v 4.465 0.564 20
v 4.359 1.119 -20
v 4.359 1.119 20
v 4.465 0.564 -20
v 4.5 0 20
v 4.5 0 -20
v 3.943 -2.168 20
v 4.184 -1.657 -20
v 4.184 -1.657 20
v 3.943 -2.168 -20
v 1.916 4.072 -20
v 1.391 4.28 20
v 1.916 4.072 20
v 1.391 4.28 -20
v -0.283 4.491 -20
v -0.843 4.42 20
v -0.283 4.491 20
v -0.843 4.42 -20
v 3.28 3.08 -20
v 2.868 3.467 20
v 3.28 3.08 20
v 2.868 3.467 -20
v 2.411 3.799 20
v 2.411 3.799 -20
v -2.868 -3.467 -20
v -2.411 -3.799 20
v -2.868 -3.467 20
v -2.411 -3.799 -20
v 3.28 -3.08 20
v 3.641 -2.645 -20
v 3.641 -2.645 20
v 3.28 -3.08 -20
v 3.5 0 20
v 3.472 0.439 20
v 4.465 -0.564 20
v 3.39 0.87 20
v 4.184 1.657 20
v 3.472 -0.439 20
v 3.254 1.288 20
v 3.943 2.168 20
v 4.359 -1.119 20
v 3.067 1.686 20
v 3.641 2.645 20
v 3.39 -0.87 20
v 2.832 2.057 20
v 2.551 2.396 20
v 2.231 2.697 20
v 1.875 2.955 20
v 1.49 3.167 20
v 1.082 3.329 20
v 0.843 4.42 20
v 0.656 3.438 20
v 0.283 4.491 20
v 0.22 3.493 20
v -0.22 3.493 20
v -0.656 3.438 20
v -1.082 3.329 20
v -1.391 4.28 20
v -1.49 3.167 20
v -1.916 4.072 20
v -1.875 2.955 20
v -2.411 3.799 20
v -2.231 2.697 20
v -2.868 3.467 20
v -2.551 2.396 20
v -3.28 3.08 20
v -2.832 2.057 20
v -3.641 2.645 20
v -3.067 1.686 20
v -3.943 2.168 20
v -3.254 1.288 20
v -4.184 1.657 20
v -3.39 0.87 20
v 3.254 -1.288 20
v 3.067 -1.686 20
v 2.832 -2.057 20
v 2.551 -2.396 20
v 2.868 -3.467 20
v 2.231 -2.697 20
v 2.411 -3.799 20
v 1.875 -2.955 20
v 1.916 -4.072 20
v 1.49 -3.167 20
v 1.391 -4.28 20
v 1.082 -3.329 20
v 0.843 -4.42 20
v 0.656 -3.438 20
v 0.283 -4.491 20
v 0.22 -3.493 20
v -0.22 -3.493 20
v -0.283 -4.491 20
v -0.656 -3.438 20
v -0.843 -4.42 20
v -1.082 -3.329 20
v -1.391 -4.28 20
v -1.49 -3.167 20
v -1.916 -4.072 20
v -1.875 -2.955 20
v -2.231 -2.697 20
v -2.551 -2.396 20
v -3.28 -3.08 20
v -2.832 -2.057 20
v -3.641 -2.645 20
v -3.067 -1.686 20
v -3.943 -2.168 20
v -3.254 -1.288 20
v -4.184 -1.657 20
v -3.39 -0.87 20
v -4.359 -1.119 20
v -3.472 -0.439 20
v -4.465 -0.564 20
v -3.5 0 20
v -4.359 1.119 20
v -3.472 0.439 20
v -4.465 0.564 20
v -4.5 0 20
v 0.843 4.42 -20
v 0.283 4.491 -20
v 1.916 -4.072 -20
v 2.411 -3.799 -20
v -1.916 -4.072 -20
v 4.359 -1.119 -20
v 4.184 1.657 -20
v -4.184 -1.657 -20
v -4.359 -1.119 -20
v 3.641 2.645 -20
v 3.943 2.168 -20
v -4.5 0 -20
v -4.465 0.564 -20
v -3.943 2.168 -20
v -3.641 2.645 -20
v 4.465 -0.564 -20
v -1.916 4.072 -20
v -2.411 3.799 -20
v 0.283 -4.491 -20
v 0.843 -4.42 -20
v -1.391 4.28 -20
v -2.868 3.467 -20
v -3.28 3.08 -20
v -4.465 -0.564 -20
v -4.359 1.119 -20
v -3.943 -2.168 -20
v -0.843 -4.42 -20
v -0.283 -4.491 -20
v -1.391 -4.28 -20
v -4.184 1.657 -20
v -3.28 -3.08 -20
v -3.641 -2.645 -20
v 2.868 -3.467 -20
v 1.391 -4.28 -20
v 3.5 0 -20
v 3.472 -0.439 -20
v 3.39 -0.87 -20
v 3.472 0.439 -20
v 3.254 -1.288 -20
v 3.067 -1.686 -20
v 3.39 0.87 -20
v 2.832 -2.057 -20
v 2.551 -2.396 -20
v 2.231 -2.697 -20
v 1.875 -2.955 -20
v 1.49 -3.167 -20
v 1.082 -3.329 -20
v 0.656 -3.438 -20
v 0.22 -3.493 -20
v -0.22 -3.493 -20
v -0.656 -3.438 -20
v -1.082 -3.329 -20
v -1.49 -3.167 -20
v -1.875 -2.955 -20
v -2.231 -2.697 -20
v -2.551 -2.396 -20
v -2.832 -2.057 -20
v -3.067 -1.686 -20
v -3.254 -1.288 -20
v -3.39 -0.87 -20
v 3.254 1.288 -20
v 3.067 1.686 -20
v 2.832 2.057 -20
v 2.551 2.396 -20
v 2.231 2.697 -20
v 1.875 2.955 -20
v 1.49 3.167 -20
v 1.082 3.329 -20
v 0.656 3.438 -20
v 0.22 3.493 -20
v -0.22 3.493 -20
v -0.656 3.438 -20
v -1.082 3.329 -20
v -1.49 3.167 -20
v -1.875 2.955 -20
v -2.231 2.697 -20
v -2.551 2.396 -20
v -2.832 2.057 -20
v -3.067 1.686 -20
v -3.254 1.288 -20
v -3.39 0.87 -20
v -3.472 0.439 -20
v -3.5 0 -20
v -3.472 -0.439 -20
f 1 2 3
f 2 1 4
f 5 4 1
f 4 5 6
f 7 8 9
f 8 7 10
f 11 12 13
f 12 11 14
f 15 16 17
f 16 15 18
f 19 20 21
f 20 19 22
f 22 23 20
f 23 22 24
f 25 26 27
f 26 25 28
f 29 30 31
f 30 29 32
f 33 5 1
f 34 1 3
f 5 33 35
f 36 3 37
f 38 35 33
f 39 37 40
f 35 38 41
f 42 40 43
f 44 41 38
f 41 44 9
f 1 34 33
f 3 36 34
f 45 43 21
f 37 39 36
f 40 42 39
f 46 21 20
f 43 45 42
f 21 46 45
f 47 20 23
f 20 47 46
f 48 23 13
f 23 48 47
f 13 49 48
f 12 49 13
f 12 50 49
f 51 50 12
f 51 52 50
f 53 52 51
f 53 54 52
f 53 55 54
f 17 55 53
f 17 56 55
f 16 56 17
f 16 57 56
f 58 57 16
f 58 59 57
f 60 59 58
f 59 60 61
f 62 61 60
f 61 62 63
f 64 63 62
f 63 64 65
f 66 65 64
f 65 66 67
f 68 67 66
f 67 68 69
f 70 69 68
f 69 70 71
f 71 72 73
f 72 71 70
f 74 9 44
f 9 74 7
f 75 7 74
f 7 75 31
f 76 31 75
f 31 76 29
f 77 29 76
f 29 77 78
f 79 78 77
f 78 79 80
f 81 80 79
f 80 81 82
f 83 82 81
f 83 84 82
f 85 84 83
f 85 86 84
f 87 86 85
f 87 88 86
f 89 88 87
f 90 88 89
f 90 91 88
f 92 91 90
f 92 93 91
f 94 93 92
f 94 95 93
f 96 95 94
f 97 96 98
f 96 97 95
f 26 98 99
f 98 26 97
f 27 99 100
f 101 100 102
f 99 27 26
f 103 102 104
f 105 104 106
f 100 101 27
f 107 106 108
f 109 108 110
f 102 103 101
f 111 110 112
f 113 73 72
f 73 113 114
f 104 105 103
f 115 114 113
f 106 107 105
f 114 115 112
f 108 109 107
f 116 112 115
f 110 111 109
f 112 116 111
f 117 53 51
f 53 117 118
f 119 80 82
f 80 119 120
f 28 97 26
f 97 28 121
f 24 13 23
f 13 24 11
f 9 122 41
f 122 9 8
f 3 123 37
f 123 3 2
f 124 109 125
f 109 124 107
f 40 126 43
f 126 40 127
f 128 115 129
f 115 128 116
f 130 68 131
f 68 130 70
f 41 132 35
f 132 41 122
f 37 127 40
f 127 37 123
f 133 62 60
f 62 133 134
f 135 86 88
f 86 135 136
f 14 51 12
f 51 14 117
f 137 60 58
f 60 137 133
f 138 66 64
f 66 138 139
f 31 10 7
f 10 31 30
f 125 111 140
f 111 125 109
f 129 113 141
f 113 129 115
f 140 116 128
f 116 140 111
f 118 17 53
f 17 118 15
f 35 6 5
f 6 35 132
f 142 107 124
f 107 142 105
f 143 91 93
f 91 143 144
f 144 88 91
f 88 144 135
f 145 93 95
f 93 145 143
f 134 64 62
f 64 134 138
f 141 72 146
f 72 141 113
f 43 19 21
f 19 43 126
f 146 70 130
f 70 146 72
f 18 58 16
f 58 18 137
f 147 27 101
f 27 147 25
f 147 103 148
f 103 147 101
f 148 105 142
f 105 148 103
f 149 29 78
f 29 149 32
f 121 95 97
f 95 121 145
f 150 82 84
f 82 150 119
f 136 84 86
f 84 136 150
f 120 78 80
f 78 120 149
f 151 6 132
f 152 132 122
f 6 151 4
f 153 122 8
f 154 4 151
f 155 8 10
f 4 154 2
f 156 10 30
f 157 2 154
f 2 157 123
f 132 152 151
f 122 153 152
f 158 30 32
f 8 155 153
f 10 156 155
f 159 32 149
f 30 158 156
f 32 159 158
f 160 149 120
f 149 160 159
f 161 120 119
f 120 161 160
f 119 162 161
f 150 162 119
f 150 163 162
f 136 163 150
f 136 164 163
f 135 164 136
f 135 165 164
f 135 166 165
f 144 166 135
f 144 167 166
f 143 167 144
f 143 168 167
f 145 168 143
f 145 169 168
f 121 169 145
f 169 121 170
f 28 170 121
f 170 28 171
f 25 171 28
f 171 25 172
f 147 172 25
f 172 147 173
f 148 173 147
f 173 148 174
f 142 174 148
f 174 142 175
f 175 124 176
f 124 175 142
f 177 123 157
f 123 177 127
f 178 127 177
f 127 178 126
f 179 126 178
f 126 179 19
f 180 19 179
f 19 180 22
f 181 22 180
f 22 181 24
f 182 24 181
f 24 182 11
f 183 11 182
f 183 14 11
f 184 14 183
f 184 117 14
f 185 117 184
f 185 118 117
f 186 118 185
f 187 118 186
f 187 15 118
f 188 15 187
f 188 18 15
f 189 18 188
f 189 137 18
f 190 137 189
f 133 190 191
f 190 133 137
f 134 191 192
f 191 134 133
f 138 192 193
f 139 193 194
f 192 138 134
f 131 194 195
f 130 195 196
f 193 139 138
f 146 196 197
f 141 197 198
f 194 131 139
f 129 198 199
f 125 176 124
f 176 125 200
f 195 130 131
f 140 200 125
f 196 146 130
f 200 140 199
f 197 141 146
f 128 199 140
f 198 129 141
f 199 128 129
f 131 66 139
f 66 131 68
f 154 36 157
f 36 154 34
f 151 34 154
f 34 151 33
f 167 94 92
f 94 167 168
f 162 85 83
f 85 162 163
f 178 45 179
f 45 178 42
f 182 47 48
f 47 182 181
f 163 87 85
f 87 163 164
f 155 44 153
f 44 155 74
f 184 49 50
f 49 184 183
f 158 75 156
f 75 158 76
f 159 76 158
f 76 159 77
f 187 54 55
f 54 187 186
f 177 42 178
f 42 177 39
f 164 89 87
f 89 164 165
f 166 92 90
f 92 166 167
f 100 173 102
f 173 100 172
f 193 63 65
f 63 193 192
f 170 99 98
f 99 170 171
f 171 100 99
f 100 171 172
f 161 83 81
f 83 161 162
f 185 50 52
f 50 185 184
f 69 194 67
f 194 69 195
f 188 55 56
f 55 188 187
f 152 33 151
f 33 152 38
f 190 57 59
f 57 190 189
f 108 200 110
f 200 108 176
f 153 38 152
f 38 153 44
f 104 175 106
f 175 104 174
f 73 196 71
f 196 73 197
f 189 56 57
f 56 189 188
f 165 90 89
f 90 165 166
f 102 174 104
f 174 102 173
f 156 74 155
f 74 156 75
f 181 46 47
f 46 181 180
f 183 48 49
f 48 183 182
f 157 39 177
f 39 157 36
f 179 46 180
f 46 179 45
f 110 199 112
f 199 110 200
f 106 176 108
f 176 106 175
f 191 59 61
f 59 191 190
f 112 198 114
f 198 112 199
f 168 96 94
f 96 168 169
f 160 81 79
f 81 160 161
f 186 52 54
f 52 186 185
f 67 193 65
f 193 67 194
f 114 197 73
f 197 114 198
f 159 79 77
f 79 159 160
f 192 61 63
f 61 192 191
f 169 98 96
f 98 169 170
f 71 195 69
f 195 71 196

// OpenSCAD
$fn = 50;


difference() {
	union() {
		translate(v = [0, 0, -20.0000000000]) {
			cylinder(h = 40, r = 4.5000000000);
		}
	}
	union() {
		translate(v = [0, 0, -100.0000000000]) {
			cylinder(h = 200, r = 3.5000000000);
		}
	}
}
